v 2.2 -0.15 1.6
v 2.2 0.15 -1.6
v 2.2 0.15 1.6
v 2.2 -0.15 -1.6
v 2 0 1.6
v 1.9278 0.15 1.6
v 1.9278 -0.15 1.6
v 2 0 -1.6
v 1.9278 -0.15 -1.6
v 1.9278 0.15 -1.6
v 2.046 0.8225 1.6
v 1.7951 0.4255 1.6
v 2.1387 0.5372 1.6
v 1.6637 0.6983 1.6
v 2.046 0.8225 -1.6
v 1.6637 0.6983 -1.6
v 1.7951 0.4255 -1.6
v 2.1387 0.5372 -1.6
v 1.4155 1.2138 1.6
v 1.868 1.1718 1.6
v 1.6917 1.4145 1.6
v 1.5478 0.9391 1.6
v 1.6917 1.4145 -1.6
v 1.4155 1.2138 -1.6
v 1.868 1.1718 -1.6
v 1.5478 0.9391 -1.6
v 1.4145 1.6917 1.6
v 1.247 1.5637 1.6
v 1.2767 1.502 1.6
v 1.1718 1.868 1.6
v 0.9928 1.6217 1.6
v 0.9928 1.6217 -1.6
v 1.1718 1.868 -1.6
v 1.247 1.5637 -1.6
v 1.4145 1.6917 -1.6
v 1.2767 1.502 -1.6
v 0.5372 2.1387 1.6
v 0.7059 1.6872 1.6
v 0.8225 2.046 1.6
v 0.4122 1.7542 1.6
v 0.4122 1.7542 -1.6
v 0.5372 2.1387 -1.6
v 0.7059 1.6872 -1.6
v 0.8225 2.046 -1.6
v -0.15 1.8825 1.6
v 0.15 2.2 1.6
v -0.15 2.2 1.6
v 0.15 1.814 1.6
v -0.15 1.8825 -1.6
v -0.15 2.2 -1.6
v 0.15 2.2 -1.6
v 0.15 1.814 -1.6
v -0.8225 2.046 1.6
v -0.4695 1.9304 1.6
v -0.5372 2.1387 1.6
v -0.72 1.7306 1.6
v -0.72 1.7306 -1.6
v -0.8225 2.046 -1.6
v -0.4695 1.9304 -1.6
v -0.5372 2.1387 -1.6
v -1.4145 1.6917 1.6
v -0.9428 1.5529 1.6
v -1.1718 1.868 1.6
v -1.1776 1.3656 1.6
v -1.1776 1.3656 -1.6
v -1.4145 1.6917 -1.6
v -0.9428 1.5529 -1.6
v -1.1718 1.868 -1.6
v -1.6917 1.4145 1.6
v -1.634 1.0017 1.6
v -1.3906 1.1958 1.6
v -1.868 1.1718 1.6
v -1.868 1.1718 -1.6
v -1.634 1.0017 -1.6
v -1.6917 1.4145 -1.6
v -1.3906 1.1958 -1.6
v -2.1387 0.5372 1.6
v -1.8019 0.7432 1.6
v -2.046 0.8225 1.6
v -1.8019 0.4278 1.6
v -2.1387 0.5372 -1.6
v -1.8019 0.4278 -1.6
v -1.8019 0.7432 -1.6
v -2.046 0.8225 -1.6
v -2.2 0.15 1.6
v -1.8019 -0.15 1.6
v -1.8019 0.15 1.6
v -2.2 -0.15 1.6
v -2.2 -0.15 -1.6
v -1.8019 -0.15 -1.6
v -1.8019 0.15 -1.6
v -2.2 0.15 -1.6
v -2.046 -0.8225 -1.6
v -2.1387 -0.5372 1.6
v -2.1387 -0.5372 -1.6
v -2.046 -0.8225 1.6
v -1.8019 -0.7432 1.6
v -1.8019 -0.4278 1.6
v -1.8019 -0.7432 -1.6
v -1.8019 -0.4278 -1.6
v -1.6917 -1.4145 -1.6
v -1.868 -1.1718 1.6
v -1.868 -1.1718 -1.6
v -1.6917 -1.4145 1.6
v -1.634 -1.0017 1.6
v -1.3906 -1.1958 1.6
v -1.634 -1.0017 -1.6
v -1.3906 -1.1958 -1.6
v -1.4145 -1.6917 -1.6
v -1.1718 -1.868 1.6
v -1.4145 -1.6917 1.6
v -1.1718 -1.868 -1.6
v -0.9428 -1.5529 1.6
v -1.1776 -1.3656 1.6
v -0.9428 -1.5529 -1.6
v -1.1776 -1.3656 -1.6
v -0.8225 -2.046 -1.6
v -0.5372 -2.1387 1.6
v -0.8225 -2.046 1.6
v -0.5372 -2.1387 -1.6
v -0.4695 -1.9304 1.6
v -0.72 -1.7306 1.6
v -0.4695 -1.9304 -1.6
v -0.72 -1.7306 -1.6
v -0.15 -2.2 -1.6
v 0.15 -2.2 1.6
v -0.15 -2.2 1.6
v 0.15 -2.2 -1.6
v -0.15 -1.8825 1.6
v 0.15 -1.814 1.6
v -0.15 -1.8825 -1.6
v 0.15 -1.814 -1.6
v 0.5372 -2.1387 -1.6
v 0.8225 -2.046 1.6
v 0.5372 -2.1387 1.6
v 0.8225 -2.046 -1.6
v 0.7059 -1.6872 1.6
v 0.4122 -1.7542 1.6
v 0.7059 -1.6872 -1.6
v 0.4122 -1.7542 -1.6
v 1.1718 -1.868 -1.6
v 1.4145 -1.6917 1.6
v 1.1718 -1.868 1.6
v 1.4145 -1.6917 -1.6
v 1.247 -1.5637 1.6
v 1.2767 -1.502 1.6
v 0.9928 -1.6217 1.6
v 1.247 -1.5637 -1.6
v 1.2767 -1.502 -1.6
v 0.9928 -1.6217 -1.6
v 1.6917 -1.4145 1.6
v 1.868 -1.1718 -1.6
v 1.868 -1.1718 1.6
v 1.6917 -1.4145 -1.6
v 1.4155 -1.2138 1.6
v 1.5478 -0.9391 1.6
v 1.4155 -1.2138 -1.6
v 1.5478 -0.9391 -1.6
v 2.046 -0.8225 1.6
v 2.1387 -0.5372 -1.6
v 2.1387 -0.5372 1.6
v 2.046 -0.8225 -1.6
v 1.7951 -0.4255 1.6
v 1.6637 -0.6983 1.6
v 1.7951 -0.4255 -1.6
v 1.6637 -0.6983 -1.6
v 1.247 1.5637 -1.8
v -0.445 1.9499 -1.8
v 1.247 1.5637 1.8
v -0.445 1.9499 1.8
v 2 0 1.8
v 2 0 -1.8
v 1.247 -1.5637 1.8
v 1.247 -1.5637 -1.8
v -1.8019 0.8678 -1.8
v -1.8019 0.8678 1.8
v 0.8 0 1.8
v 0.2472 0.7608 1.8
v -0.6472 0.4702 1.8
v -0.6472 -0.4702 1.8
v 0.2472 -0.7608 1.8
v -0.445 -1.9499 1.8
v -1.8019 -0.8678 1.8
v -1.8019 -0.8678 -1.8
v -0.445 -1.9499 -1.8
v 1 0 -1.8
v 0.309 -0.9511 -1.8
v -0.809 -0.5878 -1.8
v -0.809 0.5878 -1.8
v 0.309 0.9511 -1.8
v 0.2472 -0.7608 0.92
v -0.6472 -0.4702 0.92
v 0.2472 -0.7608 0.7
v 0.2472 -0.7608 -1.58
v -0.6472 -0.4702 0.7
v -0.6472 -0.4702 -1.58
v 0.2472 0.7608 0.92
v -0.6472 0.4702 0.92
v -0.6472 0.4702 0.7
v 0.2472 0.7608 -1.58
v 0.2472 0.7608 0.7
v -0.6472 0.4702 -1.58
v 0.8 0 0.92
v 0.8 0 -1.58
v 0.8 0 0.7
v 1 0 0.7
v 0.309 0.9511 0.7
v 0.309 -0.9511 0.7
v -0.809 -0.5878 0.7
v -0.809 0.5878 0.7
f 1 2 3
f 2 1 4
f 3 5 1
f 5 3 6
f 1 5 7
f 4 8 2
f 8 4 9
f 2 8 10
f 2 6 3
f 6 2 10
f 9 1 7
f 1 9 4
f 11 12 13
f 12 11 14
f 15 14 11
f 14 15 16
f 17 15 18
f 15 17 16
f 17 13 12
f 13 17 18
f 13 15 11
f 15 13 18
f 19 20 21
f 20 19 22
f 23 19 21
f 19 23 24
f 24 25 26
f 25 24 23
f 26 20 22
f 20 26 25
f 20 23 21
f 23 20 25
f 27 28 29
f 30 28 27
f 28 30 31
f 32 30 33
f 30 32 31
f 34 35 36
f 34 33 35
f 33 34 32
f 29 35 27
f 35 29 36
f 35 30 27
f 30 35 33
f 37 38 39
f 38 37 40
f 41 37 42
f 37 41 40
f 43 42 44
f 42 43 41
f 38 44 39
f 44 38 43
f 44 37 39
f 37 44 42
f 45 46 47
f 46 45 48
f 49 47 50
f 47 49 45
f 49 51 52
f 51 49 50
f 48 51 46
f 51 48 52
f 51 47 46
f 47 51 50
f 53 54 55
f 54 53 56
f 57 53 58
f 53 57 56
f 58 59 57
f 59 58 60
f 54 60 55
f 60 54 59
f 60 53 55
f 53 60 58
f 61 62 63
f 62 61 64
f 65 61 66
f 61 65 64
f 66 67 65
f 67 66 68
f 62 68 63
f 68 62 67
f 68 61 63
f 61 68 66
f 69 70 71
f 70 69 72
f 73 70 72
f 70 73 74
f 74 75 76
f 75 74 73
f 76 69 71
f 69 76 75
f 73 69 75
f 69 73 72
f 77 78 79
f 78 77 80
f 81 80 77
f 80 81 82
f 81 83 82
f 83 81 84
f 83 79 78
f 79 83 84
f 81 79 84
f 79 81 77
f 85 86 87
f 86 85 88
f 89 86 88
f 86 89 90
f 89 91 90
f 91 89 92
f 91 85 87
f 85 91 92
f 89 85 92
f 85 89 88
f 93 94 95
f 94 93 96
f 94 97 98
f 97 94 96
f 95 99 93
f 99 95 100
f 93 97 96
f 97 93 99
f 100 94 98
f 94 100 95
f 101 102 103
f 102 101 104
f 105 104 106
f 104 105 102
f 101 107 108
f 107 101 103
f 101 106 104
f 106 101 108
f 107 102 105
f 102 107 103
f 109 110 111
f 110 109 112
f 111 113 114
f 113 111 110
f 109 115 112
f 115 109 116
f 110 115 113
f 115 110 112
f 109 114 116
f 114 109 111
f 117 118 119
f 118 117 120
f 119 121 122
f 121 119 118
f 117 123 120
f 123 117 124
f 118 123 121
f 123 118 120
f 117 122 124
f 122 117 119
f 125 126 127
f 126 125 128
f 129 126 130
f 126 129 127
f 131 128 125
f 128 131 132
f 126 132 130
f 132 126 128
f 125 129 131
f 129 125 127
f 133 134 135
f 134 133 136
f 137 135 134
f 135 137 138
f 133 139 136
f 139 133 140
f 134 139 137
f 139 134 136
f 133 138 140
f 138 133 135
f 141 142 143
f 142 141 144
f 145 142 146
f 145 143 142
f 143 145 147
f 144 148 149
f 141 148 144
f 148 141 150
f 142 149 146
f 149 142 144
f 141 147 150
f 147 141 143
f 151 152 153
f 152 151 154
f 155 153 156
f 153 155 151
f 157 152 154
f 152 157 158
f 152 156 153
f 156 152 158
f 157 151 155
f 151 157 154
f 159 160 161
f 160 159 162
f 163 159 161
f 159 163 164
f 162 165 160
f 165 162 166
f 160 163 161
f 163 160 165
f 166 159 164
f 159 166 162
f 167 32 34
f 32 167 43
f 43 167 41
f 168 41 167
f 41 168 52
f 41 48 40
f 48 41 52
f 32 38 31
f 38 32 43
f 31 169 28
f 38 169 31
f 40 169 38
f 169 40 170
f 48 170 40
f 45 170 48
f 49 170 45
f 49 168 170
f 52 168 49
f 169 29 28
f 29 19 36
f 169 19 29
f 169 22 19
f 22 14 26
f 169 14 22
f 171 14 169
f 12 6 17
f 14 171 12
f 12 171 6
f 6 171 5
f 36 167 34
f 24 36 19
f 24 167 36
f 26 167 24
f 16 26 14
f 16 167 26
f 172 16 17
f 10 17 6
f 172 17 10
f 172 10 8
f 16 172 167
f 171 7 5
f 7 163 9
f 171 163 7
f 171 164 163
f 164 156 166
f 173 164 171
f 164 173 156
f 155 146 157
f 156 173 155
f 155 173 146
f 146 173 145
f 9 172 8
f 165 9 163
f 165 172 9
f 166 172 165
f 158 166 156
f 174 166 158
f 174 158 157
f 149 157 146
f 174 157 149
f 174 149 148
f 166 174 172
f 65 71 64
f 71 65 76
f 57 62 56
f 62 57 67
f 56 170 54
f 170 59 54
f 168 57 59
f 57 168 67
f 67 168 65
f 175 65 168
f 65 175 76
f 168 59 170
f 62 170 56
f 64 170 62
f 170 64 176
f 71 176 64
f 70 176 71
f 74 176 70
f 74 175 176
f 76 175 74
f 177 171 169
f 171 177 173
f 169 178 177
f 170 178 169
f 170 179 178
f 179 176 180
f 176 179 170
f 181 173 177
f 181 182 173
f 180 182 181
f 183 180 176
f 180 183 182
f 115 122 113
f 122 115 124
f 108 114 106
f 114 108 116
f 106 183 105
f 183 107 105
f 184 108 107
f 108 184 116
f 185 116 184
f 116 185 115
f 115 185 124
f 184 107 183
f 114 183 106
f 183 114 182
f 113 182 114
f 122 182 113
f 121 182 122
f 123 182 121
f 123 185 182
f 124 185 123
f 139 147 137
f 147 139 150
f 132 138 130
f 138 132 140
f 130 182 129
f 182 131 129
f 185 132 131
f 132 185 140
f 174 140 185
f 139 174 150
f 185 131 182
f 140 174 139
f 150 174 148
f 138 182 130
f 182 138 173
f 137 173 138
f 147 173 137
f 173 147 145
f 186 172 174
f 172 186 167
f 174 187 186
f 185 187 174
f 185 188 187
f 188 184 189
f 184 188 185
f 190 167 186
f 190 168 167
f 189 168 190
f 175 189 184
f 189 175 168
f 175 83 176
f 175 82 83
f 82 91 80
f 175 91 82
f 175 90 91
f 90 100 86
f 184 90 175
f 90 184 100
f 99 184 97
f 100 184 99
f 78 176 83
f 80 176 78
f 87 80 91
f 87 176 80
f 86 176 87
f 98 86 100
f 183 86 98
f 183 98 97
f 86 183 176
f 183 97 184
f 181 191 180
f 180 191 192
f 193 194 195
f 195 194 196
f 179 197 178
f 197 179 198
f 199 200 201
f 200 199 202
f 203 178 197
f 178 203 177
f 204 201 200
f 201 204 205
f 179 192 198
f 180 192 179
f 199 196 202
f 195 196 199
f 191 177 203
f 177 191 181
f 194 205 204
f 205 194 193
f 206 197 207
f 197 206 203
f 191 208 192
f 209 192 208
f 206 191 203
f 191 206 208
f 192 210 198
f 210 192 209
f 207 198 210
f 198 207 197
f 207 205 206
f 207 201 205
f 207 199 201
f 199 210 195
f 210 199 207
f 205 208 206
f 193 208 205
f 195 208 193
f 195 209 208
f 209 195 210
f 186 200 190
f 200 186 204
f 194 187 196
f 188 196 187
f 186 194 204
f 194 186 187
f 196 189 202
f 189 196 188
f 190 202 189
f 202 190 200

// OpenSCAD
// Parameters
outer_diameter_mm = 4; //[2:8:0.1]
length_mm = 3.6; //[1.8:7.2:0.1]
screw_diameter_mm = 2; //[1:4:0.1]
internal_pilot_diameter_mm = 1.6; //[0.8:3.2:0.05]
internal_minor_diameter_mm = 1.6; //[0.8:3.2:0.05]
internal_major_diameter_mm = 2; //[1:4:0.05]
top_chamfer_depth_mm = 0.3; //[0.15:0.6:0.05]
bottom_chamfer_depth_mm = 0.3; //[0.15:0.6:0.05]
knurl_depth_mm = 0.2; //[0.1:0.4:0.05]
knurl_pitch_mm = 0.6; //[0.3:1.2:0.05]
overlap_mm = 0.8; //[0.5:2:0.1]
knurl_count = 20; //[8:40:1]

// Threaded Insert - complete geometry
module threaded_insert() {
  color([0.8, 0.6, 0.2]) { // Brass color
    difference() {
      union() {
        // Outer cylinder
        translate([0, 0, 0])
          cylinder(r=outer_diameter_mm/2, h=length_mm, center=true);

        // Knurl ribs
        for (i = [0:knurl_count-1]) {
          rotate([0, 0, i*360/knurl_count])
            translate([outer_diameter_mm/2 + (knurl_depth_mm + overlap_mm)/2 - overlap_mm, 0, 0])
              cube([knurl_depth_mm + overlap_mm, knurl_pitch_mm/2, length_mm - 2*(top_chamfer_depth_mm + bottom_chamfer_depth_mm)/3], center=true);
        }
      }

      // Internal bore
      translate([0, 0, 0])
        cylinder(r=internal_minor_diameter_mm/2, h=length_mm + 2*overlap_mm, center=true);

      // Top entry chamfer
      translate([0, 0, length_mm/2 - (top_chamfer_depth_mm + overlap_mm)/2])
        cylinder(r1=internal_major_diameter_mm/2, r2=0, h=top_chamfer_depth_mm + overlap_mm, center=true);

      // Bottom lead-in chamfer
      translate([0, 0, -length_mm/2 + (bottom_chamfer_depth_mm + overlap_mm)/2])
        cylinder(r1=internal_major_diameter_mm/2, r2=0, h=bottom_chamfer_depth_mm + overlap_mm, center=true);
    }
  }
}

// Assembly
module assembly() {
  threaded_insert();
}

assembly();
